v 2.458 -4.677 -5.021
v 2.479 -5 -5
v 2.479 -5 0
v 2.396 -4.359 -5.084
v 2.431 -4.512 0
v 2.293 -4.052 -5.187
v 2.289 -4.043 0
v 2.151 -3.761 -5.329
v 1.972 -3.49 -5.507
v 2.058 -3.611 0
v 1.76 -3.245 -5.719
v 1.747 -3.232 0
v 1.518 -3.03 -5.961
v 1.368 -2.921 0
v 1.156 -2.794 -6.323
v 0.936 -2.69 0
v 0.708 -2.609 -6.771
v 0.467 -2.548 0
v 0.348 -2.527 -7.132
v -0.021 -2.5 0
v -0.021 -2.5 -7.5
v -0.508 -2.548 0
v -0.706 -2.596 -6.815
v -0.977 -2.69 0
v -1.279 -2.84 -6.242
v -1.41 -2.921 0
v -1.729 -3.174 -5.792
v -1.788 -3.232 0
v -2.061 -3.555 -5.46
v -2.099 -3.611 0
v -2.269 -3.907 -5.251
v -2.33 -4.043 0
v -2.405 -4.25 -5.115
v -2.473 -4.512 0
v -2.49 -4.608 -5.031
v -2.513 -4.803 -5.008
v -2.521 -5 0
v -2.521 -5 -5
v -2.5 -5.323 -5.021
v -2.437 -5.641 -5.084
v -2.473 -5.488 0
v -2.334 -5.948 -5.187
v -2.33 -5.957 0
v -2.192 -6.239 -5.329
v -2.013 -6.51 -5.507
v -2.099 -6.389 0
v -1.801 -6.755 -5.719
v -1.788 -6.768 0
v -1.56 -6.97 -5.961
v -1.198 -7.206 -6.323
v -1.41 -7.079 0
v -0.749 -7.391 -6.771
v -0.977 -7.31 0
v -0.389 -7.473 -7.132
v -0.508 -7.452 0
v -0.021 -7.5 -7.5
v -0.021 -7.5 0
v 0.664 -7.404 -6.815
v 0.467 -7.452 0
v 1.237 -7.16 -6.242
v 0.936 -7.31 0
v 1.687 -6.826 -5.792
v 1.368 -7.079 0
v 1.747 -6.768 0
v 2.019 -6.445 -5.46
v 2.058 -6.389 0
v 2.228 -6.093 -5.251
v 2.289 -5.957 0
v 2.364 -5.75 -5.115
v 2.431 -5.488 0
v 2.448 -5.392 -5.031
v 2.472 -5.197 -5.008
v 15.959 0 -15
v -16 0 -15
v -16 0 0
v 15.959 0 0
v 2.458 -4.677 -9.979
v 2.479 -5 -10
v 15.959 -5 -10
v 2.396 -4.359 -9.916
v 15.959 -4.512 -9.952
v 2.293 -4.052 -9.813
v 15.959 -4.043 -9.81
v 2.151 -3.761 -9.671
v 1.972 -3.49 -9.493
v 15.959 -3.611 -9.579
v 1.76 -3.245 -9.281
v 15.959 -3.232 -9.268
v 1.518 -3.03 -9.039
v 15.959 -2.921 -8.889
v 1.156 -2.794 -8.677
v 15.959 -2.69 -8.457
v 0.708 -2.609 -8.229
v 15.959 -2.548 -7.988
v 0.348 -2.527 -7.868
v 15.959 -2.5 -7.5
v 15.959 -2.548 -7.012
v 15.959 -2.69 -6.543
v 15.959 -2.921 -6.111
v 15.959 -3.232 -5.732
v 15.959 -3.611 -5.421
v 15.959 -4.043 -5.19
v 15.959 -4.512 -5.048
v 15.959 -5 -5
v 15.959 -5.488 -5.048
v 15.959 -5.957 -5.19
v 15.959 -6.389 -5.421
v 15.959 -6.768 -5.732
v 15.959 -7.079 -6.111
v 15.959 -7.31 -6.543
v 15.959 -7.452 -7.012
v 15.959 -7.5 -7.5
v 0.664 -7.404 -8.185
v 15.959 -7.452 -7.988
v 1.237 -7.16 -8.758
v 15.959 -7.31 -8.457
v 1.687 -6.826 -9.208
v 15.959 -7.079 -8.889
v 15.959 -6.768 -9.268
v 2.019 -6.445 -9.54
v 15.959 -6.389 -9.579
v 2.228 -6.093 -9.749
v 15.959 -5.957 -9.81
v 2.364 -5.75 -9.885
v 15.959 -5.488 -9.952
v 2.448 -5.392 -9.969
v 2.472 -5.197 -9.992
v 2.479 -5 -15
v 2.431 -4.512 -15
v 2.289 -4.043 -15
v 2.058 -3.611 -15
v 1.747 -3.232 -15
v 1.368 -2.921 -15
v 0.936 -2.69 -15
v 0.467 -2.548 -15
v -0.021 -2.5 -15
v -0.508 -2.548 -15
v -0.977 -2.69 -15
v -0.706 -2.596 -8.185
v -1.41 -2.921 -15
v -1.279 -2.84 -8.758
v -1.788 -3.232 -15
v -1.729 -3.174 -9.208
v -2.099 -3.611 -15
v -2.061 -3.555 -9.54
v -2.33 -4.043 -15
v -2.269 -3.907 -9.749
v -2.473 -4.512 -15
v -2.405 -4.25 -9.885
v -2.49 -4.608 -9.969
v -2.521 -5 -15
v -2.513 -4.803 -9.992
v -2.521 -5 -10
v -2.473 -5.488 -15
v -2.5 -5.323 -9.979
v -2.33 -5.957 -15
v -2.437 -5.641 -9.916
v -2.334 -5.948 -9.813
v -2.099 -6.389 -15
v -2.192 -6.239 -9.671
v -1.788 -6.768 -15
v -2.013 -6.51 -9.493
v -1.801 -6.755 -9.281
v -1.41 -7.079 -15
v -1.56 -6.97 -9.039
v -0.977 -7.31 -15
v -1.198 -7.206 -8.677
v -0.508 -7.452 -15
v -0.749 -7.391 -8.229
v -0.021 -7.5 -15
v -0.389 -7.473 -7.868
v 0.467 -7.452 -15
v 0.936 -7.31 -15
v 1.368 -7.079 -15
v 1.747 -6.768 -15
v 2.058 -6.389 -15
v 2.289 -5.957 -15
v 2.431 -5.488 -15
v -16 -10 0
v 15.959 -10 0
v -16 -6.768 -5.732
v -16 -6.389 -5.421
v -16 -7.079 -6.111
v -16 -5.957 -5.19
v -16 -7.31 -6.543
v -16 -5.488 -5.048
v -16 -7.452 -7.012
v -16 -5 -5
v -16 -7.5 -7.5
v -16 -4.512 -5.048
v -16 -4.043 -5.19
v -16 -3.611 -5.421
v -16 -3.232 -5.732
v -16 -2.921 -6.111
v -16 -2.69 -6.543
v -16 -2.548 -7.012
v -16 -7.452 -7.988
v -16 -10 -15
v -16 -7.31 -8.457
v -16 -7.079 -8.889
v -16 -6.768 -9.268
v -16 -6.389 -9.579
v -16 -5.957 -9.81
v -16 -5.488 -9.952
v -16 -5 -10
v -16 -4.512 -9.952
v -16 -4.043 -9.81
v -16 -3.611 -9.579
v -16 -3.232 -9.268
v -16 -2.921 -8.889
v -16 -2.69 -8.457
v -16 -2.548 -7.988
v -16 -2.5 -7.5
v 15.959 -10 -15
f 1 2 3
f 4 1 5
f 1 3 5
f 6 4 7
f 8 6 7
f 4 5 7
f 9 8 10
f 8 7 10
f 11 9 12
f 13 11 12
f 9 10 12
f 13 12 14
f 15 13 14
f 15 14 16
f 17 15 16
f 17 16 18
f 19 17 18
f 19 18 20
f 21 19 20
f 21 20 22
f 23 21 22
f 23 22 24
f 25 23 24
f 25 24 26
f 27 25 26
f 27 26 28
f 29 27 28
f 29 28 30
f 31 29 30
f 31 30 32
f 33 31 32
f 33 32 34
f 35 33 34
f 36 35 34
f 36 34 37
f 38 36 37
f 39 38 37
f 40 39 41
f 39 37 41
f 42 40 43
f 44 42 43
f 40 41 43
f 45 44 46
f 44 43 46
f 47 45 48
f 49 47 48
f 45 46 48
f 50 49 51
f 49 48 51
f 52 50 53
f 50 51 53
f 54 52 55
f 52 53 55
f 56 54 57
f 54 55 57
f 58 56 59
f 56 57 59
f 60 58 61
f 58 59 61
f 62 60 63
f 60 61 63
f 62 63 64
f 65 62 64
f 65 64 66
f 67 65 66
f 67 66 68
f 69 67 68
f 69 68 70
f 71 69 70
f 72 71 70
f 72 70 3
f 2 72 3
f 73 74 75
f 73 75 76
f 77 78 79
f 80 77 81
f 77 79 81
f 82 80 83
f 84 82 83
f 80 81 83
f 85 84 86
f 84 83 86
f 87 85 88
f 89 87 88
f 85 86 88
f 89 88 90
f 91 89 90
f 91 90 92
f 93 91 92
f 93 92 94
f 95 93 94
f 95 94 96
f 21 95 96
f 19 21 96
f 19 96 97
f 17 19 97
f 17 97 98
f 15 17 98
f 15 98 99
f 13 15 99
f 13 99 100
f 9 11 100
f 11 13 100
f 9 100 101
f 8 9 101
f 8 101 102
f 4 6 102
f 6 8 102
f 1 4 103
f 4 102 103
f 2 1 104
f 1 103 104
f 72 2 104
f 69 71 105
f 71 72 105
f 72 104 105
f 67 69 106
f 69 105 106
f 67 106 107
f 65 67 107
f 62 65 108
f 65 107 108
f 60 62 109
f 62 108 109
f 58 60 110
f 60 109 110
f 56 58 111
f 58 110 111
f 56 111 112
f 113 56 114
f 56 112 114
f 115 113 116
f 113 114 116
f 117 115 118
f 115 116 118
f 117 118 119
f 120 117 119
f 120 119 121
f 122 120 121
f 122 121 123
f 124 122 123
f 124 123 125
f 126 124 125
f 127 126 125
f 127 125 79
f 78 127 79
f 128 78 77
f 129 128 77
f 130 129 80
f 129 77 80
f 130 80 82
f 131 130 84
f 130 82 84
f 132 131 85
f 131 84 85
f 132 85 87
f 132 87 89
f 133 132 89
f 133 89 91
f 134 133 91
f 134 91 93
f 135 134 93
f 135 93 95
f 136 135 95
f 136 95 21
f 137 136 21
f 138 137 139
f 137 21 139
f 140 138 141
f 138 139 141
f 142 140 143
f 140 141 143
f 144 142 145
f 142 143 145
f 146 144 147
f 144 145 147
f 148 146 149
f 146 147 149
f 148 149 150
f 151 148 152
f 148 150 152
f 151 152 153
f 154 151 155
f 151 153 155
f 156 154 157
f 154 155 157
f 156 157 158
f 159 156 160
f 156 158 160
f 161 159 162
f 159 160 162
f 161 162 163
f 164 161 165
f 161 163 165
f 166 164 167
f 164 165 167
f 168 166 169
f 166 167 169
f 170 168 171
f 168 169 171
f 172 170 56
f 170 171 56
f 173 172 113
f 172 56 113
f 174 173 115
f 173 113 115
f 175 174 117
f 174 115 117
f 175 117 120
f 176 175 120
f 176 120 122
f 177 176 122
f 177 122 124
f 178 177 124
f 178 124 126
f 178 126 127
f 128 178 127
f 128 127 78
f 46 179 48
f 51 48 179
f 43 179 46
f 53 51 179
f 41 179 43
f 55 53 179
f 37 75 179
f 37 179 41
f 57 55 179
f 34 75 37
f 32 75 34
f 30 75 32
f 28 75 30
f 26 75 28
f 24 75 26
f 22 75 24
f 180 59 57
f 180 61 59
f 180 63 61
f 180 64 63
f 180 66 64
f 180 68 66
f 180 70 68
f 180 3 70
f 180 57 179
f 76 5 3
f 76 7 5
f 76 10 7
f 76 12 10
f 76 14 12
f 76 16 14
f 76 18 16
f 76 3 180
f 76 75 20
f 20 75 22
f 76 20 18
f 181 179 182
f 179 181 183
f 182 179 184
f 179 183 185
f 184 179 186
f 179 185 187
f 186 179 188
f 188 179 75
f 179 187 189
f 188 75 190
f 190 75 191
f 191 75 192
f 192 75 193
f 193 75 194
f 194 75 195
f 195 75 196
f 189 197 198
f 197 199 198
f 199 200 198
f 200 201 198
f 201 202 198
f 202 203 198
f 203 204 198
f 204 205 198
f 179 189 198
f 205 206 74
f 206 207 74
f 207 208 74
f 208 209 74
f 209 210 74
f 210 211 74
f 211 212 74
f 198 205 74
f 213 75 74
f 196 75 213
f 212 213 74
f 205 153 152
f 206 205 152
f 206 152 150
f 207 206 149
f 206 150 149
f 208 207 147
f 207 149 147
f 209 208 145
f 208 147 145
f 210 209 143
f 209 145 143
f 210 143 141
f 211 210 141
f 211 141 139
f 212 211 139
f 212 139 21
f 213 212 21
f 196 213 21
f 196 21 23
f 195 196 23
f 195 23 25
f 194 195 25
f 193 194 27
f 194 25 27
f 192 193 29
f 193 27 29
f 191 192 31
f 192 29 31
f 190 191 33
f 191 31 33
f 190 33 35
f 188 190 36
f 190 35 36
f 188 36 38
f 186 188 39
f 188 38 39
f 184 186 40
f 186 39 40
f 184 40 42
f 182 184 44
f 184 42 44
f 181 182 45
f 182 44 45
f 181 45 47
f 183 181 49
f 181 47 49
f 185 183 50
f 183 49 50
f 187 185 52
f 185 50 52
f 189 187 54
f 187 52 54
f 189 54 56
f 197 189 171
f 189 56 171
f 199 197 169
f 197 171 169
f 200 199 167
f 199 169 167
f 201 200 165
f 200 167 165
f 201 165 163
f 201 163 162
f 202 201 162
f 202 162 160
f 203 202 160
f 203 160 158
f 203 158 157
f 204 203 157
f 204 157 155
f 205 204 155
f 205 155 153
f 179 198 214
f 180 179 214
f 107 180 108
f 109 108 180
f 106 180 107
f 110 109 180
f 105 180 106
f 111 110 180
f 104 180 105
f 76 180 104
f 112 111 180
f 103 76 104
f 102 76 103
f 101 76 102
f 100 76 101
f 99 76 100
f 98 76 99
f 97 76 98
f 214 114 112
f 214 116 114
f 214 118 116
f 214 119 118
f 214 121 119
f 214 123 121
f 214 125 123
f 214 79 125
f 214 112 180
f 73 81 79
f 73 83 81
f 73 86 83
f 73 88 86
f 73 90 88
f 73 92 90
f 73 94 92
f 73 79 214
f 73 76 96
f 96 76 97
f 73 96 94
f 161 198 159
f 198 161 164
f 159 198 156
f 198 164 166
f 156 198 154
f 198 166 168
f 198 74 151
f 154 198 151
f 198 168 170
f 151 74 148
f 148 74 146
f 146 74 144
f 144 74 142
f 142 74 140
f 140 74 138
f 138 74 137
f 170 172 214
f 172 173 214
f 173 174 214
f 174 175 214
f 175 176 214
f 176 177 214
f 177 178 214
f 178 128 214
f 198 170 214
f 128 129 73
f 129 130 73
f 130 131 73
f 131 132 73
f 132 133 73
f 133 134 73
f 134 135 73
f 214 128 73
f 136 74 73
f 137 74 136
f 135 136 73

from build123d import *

# Parameters (mm, degrees)
SCHIZZO1_W                   = 31.958658916
SCHIZZO1_H                   = 15
ESTRUSIONE_ESTRUSIONE1_DEPTH = 10
SCHIZZO4_R                   = 2.5
TAGLIO_ESTRUSIONE1_DEPTH     = 25.103941586
SCHIZZO5_R                   = 2.5
TAGLIO_ESTRUSIONE2_DEPTH     = 37.692722435


with BuildPart() as part:
    # Schizzo1 → Estrusione-Estrusione1 (new body)
    with BuildSketch(Plane(origin=(0, 0, 0), x_dir=(1, 0, 0), z_dir=(0, 1, 0))):
        with Locations((-0.020670542, 7.5)):
            Rectangle(SCHIZZO1_W, SCHIZZO1_H)
    extrude(amount=-ESTRUSIONE_ESTRUSIONE1_DEPTH)

    # Schizzo4 → Taglio-Estrusione1 (cut, through all)
    with BuildSketch(Plane.XY):
        with Locations((-0.020670542, -5)):
            Circle(SCHIZZO4_R)
    extrude(amount=-TAGLIO_ESTRUSIONE1_DEPTH, mode=Mode.SUBTRACT)

    # Schizzo5 → Taglio-Estrusione2 (cut, through all)
    with BuildSketch(Plane(origin=(15.958658916, 0, 0), x_dir=(0, 0, -1), z_dir=(1, 0, 0))):
        with Locations((7.5, -5)):
            Circle(SCHIZZO5_R)
    extrude(amount=-TAGLIO_ESTRUSIONE2_DEPTH, mode=Mode.SUBTRACT)


solid = part.part
